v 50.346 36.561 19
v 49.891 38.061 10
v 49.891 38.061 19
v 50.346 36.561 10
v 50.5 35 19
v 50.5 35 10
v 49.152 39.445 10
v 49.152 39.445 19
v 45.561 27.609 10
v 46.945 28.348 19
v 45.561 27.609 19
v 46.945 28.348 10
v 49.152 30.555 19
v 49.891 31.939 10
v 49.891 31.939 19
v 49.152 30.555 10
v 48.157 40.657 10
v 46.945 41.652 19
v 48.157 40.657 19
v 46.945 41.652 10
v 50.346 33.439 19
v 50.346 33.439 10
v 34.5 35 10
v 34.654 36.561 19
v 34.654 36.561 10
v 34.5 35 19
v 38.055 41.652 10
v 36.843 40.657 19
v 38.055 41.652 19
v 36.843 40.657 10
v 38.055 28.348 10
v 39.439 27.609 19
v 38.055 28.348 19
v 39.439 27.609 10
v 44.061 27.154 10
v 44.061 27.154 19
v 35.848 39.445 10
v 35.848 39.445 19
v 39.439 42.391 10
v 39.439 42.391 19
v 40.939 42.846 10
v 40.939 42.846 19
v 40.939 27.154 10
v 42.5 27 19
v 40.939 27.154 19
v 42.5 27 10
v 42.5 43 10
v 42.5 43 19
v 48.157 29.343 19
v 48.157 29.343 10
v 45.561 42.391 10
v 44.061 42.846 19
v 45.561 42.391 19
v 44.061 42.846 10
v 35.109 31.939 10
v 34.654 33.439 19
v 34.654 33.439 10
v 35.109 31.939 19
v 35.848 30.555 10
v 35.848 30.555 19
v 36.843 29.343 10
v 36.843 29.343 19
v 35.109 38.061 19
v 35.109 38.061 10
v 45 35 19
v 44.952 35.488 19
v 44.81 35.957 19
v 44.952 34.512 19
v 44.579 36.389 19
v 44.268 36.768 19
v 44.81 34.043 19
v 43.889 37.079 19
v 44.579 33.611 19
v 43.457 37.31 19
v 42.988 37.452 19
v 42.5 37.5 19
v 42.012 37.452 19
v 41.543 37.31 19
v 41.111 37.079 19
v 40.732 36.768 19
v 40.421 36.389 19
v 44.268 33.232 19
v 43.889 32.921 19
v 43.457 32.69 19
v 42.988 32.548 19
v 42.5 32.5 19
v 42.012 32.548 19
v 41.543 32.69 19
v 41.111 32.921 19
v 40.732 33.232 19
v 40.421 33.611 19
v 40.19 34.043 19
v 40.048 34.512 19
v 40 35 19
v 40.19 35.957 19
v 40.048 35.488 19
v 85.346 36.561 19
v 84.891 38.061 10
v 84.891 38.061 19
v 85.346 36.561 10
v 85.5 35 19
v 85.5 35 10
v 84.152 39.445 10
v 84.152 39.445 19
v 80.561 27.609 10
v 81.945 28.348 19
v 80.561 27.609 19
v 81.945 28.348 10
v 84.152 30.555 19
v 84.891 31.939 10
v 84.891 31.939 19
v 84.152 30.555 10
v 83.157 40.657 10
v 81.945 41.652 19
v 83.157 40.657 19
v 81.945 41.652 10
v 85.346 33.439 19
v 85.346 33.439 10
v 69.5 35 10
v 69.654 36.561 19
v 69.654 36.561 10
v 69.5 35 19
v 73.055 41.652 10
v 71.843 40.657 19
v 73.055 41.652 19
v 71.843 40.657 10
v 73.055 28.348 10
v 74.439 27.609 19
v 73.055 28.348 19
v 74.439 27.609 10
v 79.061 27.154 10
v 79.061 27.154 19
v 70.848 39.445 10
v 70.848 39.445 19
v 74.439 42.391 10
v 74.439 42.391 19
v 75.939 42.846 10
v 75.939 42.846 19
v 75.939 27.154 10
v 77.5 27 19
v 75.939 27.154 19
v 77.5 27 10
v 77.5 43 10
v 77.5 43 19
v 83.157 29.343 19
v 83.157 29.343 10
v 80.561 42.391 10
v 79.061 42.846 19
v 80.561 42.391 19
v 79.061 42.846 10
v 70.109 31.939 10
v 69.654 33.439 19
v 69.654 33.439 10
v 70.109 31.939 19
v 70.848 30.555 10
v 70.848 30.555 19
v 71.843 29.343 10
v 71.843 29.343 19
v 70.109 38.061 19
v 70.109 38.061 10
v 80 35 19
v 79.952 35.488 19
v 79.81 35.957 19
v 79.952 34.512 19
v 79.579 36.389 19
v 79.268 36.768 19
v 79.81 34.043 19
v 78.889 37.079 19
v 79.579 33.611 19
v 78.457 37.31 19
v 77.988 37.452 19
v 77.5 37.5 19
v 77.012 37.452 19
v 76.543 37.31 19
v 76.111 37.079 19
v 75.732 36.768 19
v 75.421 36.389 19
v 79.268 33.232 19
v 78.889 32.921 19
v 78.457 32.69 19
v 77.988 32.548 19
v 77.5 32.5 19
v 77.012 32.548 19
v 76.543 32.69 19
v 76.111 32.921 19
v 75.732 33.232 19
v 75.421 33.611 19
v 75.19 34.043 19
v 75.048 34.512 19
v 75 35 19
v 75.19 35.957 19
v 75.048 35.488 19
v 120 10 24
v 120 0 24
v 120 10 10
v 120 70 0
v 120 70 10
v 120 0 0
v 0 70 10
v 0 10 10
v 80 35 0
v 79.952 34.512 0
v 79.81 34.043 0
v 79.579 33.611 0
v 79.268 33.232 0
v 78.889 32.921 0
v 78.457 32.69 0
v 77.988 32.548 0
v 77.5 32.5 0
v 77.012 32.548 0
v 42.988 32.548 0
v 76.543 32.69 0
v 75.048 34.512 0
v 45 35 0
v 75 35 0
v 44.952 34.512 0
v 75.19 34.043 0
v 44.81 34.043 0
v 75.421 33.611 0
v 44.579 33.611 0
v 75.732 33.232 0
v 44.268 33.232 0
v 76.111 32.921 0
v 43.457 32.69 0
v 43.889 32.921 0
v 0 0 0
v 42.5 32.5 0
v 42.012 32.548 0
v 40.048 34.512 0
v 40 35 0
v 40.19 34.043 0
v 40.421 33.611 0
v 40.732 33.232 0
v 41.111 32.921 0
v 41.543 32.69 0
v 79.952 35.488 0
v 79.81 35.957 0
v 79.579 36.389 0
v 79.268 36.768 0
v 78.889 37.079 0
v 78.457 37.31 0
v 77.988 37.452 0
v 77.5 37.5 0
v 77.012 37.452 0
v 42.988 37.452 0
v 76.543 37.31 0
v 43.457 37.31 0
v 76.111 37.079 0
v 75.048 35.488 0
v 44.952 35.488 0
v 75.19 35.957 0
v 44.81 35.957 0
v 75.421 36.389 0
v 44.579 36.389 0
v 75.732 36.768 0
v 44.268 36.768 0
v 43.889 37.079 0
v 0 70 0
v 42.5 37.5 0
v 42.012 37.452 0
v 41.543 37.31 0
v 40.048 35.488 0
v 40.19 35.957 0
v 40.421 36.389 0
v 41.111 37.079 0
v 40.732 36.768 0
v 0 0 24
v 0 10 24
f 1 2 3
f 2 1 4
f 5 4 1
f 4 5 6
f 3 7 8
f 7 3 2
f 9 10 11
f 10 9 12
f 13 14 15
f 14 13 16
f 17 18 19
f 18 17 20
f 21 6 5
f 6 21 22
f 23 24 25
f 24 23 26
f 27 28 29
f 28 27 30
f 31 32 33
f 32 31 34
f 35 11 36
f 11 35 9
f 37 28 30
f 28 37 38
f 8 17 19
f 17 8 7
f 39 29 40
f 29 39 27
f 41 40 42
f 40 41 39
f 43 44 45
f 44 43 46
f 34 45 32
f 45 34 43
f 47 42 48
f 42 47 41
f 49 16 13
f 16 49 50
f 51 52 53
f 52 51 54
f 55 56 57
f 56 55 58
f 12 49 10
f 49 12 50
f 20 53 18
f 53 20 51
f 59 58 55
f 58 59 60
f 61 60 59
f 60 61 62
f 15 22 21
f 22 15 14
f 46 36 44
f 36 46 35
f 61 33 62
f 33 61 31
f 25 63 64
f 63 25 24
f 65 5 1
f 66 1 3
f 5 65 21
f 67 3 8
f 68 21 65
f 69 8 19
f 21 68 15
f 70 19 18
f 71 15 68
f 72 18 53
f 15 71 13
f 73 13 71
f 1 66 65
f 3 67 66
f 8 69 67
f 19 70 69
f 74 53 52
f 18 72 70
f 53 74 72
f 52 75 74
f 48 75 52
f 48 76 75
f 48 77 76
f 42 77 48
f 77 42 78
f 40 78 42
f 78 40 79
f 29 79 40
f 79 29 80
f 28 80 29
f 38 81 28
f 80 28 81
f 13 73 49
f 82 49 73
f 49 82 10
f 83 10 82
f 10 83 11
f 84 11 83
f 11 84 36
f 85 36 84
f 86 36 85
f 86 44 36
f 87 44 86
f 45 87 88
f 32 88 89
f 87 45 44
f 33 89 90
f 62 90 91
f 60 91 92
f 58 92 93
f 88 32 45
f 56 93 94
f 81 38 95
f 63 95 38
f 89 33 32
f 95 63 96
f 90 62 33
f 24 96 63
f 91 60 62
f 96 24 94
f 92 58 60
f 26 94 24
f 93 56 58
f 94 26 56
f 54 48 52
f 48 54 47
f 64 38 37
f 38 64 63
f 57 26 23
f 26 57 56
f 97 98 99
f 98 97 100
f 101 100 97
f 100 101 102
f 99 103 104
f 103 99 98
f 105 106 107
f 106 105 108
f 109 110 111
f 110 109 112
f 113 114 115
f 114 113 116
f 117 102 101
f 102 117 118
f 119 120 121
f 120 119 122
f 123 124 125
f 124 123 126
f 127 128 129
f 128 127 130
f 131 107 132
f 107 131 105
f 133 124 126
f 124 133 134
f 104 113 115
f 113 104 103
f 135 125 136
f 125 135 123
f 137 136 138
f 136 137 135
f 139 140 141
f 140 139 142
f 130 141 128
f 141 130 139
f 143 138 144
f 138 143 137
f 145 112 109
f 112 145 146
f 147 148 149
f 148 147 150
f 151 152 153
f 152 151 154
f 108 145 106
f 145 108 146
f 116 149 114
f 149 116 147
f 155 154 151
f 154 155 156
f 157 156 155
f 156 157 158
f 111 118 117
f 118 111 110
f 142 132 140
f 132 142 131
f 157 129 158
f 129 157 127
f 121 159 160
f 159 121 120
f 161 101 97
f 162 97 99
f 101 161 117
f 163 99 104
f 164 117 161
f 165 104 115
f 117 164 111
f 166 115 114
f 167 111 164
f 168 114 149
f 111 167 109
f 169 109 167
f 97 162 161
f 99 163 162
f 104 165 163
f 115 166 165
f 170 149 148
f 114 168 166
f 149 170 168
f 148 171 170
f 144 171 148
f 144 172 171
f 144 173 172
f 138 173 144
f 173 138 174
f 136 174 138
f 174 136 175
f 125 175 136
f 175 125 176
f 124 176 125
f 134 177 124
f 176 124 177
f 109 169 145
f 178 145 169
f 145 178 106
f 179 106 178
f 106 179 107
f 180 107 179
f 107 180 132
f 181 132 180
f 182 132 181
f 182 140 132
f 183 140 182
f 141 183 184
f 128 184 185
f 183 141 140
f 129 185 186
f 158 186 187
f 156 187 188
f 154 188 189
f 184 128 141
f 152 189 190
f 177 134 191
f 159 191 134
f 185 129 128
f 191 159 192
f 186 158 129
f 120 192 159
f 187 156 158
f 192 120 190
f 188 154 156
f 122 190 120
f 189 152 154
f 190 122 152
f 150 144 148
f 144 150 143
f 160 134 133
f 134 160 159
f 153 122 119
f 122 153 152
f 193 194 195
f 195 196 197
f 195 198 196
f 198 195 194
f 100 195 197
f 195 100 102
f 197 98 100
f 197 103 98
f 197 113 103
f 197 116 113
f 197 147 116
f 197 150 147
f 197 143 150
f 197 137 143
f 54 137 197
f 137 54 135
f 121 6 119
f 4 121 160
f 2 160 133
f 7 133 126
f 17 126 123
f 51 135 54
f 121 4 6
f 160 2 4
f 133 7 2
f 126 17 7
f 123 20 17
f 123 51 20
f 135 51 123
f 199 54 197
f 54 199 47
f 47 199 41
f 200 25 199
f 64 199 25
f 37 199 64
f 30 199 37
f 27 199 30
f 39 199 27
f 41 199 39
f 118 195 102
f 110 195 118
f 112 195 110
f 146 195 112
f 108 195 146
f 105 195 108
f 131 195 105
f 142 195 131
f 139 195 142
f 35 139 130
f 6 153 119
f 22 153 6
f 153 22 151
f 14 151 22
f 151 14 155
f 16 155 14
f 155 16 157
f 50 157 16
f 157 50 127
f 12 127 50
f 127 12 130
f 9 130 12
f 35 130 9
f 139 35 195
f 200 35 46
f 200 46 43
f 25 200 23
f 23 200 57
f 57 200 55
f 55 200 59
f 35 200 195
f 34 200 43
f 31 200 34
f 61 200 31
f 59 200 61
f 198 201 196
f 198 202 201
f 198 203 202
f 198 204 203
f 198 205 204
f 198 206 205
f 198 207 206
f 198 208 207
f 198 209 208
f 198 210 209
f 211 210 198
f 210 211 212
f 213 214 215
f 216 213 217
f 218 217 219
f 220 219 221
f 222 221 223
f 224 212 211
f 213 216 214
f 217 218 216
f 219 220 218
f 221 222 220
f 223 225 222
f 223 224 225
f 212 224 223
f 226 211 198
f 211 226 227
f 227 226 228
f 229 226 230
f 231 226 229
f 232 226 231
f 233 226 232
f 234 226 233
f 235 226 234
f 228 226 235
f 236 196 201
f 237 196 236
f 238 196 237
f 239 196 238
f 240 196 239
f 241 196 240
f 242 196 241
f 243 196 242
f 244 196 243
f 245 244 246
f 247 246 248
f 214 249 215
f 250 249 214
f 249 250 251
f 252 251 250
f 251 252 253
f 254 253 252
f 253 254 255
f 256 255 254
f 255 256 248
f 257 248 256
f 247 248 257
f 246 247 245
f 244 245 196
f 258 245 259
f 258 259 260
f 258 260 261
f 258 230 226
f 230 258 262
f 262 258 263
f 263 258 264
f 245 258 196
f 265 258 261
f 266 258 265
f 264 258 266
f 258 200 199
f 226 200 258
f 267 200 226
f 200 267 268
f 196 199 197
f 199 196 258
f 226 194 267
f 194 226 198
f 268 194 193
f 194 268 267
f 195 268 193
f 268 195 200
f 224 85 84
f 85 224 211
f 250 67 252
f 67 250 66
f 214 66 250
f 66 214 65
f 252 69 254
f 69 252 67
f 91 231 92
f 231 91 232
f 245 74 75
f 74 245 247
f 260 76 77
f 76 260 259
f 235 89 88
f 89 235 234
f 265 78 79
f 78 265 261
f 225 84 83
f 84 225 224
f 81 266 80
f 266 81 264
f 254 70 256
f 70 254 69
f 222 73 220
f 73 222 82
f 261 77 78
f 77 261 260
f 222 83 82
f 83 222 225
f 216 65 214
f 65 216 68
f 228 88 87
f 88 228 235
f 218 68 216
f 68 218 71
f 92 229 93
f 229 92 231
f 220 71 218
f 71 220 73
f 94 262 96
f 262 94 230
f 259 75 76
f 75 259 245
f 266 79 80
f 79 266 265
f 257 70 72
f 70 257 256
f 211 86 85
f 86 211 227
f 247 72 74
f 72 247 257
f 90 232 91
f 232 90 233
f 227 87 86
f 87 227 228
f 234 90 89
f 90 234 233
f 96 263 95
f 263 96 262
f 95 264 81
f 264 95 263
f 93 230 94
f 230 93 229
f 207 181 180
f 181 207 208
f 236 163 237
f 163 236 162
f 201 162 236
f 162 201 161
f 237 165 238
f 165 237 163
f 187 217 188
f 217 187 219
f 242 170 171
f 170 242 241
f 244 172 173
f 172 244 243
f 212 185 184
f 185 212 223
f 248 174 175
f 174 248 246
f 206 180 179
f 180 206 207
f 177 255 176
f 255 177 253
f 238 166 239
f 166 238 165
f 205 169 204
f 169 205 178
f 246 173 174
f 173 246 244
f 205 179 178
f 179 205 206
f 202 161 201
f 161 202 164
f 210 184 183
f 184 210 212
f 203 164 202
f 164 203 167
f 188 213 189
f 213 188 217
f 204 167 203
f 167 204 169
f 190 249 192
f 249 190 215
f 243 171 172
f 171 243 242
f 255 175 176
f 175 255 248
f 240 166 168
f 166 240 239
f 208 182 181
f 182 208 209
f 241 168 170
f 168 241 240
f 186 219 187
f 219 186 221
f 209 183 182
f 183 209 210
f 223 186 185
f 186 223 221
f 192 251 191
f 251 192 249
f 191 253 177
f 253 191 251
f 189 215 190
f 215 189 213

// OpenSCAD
$fn = 32;

// ----------------------------------------------------------------------
// Drill jig: fence jig
// ----------------------------------------------------------------------

// --- parameters (mm) ---
plate_l = 120;            // plate length, X
plate_w = 70;             // plate width, Y
plate_t = 10;             // plate thickness
boss_d = 16;              // guide boss diameter
boss_h = 10;              // boss height above the plate
guide_d = 5;              // guide hole diameter
boss_pitch = 35;          // boss pitch
fence_h = 15;             // fence height above the plate
fence_t = 10;             // fence thickness

n_boss = 2;  // guide bosses
boss_x0 = (plate_l - (n_boss - 1) * boss_pitch) / 2;  // first boss X
boss_top = plate_t - 1 + boss_h;  // boss crown height
fence_top = plate_t - 1 + fence_h;  // fence crown height
total_h = max([fence_top, boss_top]);  // overall height

difference() {
  union() {
  cube([plate_l, plate_w, plate_t]);
  for (i = [0 : n_boss - 1])
    translate([boss_x0 + i * boss_pitch, plate_w / 2, plate_t - 1])
      cylinder(h = boss_h, d = boss_d);
  translate([0, 0, plate_t - 1]) cube([plate_l, fence_t, fence_h]);
  }
  for (i = [0 : n_boss - 1])
    translate([boss_x0 + i * boss_pitch, plate_w / 2, -1])
      cylinder(h = plate_t + boss_h, d = guide_d);
}
